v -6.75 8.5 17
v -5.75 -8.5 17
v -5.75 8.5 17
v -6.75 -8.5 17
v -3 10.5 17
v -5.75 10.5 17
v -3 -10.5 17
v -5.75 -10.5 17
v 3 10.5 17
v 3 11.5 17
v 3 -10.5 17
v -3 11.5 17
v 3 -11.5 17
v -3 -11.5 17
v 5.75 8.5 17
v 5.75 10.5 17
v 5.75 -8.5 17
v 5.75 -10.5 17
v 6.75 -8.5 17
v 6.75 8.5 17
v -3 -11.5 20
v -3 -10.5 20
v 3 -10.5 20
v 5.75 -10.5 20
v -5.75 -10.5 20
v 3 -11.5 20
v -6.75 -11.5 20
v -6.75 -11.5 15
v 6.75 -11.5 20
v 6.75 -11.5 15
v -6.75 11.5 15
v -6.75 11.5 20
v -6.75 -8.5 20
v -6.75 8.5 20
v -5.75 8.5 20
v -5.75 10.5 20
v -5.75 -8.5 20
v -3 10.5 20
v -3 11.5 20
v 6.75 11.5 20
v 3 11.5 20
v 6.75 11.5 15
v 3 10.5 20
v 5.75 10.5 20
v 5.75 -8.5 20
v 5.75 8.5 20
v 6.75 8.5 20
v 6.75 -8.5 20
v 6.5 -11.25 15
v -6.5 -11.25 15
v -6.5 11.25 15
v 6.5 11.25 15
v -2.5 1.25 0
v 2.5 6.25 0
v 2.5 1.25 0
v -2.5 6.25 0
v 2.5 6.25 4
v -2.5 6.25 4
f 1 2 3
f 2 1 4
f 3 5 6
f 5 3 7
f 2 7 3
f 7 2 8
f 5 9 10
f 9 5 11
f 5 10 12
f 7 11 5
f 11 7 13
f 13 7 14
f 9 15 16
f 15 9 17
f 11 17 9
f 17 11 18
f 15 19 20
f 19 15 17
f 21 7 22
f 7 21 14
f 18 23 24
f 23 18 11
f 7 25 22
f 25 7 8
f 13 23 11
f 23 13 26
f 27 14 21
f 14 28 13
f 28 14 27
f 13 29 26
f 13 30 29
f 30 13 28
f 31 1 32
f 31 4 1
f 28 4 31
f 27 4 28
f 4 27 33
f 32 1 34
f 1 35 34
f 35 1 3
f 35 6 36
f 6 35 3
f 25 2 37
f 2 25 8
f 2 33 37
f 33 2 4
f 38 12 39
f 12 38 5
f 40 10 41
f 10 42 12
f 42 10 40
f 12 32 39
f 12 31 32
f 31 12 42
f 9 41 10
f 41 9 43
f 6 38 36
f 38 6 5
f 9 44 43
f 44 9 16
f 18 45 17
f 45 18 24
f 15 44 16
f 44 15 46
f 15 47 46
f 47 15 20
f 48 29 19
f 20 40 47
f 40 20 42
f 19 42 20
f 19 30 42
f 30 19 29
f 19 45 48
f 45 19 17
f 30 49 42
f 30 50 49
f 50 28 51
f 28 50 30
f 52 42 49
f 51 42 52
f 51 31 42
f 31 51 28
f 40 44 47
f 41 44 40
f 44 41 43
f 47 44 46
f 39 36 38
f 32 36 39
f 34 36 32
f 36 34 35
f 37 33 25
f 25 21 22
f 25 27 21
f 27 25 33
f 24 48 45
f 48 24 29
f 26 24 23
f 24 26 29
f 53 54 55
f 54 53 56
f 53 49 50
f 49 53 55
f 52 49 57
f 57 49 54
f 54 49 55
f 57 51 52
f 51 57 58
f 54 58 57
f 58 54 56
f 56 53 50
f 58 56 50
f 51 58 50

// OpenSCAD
// file: solenoid-mount.scad
module SolenoidMount() {
  bottom_padding = 2;

  solenoid_z = 12;
  solenoid_x = 11.5;
  solenoid_y = 21;

  wall_thickness = 1;

  case_z = solenoid_z;
  case_x = solenoid_x + (wall_thickness * 2);
  case_y = solenoid_y + (wall_thickness * 2);

  shaft_width_front = 3;
  shaft_width_back = 6;
  corner_height = 3;

  union() {
    difference() {
      linear_extrude(corner_height + bottom_padding)
        square(size = [case_x, case_y], center = true);

      // Solenoid cutout
      translate([0, 0, bottom_padding])
        linear_extrude(solenoid_z)
        square(size = [solenoid_x, solenoid_y], center = true);

      for(i = [-1, 1]) {
        translate([0, i *((solenoid_y / 2) + (wall_thickness / 2)), bottom_padding])
          linear_extrude(solenoid_z)
          square(size = [shaft_width_back, wall_thickness], center = true);

        translate([i *((solenoid_x / 2) + (wall_thickness / 2)), 0, bottom_padding])
          linear_extrude(solenoid_z)
          square(size = [wall_thickness, solenoid_y - 4], center = true);
      }
    }
  }
}

SolenoidMount();
// main file
module SolenoidStand(z, bottom_shift, ridge_thickness, outer_radius) {
  solenoid_x = 11;
  solenoid_y = 20.5;
  wall_thickness = 1;

  // These are from the solenoid mount file
  top_x = solenoid_x + (wall_thickness * 2);
  top_y = solenoid_y + (wall_thickness * 2);

  bottom_x = ridge_thickness;
  bottom_y = ridge_thickness;

  function center_square_points(x, y, z) = [
    [-(x / 2), -(y / 2), z],
    [(x / 2),  -(y / 2), z],
    [(x / 2),   (y / 2), z],
    [-(x / 2),  (y / 2), z],
  ];

    function translate_points(list, x, y) = [for (elm = list) [elm[0] + x, elm[1] + y, elm[2]] ];

    solenoid_mounting_z = z;

    bottom_square_points = [
      [-(bottom_x / 2), -(bottom_y / 2), 0],
      [ (bottom_x / 2), -(bottom_y / 2), 0],
      [ (bottom_x / 2),  (bottom_y / 2), 0],
      [-(bottom_x / 2),  (bottom_y / 2), 0],
    ];

    //bottom_square = translate_points(bottom_square_points, 0, ((top_y / 2) - (bottom_y / 2)) - bottom_shift);
    bottom_square = translate_points(bottom_square_points, 0, ((top_y / 2) - (bottom_y / 2)) - bottom_shift);
    post_points = [
      [bottom_square[2][0], bottom_square[2][1], ridge_thickness - 1],
      [bottom_square[3][0], bottom_square[3][1], ridge_thickness - 1],
    ];

    TrapezoidPoints = concat(
        bottom_square,
        center_square_points(top_x, top_y, solenoid_mounting_z),
        post_points);

    // The right, back, and left sides aren't flat, so they're split into triangles.
    CubeFaces = [
      [0,1,2,3],  // bottom
      [4,5,1,0],  // front
      [7,6,5,4],  // top
      [5,6,8], [5,8,2], [5,2,1],  // right
      [6,7,9], [6,9,8], [9,3,2], [9,2,8],  // back
      [4,0,3], [4,3,9], [4,9,7],  // left
    ];

    polyhedron(TrapezoidPoints, CubeFaces, convexity = 10);
}

use <solenoid-mount.scad>

translate([0, 0, 15])
SolenoidMount();
SolenoidStand(15, 5, 5, 48);
